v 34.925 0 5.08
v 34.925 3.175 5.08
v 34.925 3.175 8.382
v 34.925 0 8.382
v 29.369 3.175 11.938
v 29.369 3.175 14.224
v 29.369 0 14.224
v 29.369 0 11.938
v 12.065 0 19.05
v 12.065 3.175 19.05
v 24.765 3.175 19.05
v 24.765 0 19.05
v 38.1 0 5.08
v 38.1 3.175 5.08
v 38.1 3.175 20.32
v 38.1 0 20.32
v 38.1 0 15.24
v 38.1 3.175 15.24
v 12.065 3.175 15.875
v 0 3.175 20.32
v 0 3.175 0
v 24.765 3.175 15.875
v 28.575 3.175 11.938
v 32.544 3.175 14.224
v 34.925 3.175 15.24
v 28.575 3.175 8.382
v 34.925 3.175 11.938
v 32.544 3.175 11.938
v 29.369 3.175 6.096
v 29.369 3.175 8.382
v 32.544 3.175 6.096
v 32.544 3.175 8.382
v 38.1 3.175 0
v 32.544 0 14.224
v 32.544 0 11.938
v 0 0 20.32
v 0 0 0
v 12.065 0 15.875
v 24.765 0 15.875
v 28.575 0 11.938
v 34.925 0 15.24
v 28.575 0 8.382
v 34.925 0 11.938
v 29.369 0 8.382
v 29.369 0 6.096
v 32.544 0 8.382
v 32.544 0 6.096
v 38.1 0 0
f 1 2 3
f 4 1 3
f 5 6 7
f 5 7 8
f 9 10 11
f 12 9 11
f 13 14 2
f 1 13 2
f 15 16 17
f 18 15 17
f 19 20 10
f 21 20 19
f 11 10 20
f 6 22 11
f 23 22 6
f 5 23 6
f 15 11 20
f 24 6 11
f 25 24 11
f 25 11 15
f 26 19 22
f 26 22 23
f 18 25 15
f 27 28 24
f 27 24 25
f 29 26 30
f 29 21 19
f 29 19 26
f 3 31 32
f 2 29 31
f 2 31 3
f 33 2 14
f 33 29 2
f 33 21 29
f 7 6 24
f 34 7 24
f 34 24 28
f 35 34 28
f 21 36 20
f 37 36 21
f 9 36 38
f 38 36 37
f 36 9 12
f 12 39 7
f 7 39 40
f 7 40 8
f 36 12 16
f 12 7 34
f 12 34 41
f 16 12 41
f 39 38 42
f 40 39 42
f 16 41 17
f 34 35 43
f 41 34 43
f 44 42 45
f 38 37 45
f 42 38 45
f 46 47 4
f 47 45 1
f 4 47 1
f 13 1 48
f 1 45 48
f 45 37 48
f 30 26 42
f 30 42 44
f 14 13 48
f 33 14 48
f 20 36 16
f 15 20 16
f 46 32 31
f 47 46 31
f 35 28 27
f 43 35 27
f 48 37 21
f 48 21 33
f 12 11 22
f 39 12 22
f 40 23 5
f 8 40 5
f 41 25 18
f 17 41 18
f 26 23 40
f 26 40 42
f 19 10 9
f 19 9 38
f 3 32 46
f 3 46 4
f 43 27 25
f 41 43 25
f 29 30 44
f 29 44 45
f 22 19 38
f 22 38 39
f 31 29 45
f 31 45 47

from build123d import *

# Parameters (mm, degrees)
SKETCH1_W           = 38.1
SKETCH1_H           = 20.32
BOSS_EXTRUDE1_DEPTH = 3.175
CUT_EXTRUDE1_DEPTH  = 3.175
SKETCH5_W           = 3.175
SKETCH5_H           = 8.128
CUT_EXTRUDE2_DEPTH  = 3.175
SKETCH6_W           = 12.7
SKETCH6_H           = 3.175
CUT_EXTRUDE3_DEPTH  = 3.175


with BuildPart() as part:
    # Sketch1 → Boss-Extrude1 (new body)
    with BuildSketch(Plane(origin=(0, 0, 0), x_dir=(1, 0, 0), z_dir=(0, 1, 0))):
        with Locations((19.05, -10.16)):
            Rectangle(SKETCH1_W, SKETCH1_H)
    extrude(amount=BOSS_EXTRUDE1_DEPTH)

    # Sketch4 → Cut-Extrude1 (cut)
    with BuildSketch(Plane(origin=(0, 3.175, 0), x_dir=(1, 0, 0), z_dir=(0, 1, 0))):
        Polygon((38.1, -15.24), (38.1, -5.08), (34.925, -5.08), (34.925, -8.382), (28.575, -8.382), (28.575, -11.938), (34.925, -11.938), (34.925, -15.24), align=None)
    extrude(amount=-CUT_EXTRUDE1_DEPTH, mode=Mode.SUBTRACT)

    # Sketch5 → Cut-Extrude2 (cut)
    with BuildSketch(Plane(origin=(0, 3.175, 0), x_dir=(1, 0, 0), z_dir=(0, 1, 0))):
        with Locations((30.95625, -10.16)):
            Rectangle(SKETCH5_W, SKETCH5_H)
    extrude(amount=-CUT_EXTRUDE2_DEPTH, mode=Mode.SUBTRACT)

    # Sketch6 → Cut-Extrude3 (cut)
    with BuildSketch(Plane(origin=(0, 3.175, 0), x_dir=(1, 0, 0), z_dir=(0, 1, 0))):
        with Locations((18.415, -17.4625)):
            Rectangle(SKETCH6_W, SKETCH6_H)
    extrude(amount=-CUT_EXTRUDE3_DEPTH, mode=Mode.SUBTRACT)


solid = part.part
